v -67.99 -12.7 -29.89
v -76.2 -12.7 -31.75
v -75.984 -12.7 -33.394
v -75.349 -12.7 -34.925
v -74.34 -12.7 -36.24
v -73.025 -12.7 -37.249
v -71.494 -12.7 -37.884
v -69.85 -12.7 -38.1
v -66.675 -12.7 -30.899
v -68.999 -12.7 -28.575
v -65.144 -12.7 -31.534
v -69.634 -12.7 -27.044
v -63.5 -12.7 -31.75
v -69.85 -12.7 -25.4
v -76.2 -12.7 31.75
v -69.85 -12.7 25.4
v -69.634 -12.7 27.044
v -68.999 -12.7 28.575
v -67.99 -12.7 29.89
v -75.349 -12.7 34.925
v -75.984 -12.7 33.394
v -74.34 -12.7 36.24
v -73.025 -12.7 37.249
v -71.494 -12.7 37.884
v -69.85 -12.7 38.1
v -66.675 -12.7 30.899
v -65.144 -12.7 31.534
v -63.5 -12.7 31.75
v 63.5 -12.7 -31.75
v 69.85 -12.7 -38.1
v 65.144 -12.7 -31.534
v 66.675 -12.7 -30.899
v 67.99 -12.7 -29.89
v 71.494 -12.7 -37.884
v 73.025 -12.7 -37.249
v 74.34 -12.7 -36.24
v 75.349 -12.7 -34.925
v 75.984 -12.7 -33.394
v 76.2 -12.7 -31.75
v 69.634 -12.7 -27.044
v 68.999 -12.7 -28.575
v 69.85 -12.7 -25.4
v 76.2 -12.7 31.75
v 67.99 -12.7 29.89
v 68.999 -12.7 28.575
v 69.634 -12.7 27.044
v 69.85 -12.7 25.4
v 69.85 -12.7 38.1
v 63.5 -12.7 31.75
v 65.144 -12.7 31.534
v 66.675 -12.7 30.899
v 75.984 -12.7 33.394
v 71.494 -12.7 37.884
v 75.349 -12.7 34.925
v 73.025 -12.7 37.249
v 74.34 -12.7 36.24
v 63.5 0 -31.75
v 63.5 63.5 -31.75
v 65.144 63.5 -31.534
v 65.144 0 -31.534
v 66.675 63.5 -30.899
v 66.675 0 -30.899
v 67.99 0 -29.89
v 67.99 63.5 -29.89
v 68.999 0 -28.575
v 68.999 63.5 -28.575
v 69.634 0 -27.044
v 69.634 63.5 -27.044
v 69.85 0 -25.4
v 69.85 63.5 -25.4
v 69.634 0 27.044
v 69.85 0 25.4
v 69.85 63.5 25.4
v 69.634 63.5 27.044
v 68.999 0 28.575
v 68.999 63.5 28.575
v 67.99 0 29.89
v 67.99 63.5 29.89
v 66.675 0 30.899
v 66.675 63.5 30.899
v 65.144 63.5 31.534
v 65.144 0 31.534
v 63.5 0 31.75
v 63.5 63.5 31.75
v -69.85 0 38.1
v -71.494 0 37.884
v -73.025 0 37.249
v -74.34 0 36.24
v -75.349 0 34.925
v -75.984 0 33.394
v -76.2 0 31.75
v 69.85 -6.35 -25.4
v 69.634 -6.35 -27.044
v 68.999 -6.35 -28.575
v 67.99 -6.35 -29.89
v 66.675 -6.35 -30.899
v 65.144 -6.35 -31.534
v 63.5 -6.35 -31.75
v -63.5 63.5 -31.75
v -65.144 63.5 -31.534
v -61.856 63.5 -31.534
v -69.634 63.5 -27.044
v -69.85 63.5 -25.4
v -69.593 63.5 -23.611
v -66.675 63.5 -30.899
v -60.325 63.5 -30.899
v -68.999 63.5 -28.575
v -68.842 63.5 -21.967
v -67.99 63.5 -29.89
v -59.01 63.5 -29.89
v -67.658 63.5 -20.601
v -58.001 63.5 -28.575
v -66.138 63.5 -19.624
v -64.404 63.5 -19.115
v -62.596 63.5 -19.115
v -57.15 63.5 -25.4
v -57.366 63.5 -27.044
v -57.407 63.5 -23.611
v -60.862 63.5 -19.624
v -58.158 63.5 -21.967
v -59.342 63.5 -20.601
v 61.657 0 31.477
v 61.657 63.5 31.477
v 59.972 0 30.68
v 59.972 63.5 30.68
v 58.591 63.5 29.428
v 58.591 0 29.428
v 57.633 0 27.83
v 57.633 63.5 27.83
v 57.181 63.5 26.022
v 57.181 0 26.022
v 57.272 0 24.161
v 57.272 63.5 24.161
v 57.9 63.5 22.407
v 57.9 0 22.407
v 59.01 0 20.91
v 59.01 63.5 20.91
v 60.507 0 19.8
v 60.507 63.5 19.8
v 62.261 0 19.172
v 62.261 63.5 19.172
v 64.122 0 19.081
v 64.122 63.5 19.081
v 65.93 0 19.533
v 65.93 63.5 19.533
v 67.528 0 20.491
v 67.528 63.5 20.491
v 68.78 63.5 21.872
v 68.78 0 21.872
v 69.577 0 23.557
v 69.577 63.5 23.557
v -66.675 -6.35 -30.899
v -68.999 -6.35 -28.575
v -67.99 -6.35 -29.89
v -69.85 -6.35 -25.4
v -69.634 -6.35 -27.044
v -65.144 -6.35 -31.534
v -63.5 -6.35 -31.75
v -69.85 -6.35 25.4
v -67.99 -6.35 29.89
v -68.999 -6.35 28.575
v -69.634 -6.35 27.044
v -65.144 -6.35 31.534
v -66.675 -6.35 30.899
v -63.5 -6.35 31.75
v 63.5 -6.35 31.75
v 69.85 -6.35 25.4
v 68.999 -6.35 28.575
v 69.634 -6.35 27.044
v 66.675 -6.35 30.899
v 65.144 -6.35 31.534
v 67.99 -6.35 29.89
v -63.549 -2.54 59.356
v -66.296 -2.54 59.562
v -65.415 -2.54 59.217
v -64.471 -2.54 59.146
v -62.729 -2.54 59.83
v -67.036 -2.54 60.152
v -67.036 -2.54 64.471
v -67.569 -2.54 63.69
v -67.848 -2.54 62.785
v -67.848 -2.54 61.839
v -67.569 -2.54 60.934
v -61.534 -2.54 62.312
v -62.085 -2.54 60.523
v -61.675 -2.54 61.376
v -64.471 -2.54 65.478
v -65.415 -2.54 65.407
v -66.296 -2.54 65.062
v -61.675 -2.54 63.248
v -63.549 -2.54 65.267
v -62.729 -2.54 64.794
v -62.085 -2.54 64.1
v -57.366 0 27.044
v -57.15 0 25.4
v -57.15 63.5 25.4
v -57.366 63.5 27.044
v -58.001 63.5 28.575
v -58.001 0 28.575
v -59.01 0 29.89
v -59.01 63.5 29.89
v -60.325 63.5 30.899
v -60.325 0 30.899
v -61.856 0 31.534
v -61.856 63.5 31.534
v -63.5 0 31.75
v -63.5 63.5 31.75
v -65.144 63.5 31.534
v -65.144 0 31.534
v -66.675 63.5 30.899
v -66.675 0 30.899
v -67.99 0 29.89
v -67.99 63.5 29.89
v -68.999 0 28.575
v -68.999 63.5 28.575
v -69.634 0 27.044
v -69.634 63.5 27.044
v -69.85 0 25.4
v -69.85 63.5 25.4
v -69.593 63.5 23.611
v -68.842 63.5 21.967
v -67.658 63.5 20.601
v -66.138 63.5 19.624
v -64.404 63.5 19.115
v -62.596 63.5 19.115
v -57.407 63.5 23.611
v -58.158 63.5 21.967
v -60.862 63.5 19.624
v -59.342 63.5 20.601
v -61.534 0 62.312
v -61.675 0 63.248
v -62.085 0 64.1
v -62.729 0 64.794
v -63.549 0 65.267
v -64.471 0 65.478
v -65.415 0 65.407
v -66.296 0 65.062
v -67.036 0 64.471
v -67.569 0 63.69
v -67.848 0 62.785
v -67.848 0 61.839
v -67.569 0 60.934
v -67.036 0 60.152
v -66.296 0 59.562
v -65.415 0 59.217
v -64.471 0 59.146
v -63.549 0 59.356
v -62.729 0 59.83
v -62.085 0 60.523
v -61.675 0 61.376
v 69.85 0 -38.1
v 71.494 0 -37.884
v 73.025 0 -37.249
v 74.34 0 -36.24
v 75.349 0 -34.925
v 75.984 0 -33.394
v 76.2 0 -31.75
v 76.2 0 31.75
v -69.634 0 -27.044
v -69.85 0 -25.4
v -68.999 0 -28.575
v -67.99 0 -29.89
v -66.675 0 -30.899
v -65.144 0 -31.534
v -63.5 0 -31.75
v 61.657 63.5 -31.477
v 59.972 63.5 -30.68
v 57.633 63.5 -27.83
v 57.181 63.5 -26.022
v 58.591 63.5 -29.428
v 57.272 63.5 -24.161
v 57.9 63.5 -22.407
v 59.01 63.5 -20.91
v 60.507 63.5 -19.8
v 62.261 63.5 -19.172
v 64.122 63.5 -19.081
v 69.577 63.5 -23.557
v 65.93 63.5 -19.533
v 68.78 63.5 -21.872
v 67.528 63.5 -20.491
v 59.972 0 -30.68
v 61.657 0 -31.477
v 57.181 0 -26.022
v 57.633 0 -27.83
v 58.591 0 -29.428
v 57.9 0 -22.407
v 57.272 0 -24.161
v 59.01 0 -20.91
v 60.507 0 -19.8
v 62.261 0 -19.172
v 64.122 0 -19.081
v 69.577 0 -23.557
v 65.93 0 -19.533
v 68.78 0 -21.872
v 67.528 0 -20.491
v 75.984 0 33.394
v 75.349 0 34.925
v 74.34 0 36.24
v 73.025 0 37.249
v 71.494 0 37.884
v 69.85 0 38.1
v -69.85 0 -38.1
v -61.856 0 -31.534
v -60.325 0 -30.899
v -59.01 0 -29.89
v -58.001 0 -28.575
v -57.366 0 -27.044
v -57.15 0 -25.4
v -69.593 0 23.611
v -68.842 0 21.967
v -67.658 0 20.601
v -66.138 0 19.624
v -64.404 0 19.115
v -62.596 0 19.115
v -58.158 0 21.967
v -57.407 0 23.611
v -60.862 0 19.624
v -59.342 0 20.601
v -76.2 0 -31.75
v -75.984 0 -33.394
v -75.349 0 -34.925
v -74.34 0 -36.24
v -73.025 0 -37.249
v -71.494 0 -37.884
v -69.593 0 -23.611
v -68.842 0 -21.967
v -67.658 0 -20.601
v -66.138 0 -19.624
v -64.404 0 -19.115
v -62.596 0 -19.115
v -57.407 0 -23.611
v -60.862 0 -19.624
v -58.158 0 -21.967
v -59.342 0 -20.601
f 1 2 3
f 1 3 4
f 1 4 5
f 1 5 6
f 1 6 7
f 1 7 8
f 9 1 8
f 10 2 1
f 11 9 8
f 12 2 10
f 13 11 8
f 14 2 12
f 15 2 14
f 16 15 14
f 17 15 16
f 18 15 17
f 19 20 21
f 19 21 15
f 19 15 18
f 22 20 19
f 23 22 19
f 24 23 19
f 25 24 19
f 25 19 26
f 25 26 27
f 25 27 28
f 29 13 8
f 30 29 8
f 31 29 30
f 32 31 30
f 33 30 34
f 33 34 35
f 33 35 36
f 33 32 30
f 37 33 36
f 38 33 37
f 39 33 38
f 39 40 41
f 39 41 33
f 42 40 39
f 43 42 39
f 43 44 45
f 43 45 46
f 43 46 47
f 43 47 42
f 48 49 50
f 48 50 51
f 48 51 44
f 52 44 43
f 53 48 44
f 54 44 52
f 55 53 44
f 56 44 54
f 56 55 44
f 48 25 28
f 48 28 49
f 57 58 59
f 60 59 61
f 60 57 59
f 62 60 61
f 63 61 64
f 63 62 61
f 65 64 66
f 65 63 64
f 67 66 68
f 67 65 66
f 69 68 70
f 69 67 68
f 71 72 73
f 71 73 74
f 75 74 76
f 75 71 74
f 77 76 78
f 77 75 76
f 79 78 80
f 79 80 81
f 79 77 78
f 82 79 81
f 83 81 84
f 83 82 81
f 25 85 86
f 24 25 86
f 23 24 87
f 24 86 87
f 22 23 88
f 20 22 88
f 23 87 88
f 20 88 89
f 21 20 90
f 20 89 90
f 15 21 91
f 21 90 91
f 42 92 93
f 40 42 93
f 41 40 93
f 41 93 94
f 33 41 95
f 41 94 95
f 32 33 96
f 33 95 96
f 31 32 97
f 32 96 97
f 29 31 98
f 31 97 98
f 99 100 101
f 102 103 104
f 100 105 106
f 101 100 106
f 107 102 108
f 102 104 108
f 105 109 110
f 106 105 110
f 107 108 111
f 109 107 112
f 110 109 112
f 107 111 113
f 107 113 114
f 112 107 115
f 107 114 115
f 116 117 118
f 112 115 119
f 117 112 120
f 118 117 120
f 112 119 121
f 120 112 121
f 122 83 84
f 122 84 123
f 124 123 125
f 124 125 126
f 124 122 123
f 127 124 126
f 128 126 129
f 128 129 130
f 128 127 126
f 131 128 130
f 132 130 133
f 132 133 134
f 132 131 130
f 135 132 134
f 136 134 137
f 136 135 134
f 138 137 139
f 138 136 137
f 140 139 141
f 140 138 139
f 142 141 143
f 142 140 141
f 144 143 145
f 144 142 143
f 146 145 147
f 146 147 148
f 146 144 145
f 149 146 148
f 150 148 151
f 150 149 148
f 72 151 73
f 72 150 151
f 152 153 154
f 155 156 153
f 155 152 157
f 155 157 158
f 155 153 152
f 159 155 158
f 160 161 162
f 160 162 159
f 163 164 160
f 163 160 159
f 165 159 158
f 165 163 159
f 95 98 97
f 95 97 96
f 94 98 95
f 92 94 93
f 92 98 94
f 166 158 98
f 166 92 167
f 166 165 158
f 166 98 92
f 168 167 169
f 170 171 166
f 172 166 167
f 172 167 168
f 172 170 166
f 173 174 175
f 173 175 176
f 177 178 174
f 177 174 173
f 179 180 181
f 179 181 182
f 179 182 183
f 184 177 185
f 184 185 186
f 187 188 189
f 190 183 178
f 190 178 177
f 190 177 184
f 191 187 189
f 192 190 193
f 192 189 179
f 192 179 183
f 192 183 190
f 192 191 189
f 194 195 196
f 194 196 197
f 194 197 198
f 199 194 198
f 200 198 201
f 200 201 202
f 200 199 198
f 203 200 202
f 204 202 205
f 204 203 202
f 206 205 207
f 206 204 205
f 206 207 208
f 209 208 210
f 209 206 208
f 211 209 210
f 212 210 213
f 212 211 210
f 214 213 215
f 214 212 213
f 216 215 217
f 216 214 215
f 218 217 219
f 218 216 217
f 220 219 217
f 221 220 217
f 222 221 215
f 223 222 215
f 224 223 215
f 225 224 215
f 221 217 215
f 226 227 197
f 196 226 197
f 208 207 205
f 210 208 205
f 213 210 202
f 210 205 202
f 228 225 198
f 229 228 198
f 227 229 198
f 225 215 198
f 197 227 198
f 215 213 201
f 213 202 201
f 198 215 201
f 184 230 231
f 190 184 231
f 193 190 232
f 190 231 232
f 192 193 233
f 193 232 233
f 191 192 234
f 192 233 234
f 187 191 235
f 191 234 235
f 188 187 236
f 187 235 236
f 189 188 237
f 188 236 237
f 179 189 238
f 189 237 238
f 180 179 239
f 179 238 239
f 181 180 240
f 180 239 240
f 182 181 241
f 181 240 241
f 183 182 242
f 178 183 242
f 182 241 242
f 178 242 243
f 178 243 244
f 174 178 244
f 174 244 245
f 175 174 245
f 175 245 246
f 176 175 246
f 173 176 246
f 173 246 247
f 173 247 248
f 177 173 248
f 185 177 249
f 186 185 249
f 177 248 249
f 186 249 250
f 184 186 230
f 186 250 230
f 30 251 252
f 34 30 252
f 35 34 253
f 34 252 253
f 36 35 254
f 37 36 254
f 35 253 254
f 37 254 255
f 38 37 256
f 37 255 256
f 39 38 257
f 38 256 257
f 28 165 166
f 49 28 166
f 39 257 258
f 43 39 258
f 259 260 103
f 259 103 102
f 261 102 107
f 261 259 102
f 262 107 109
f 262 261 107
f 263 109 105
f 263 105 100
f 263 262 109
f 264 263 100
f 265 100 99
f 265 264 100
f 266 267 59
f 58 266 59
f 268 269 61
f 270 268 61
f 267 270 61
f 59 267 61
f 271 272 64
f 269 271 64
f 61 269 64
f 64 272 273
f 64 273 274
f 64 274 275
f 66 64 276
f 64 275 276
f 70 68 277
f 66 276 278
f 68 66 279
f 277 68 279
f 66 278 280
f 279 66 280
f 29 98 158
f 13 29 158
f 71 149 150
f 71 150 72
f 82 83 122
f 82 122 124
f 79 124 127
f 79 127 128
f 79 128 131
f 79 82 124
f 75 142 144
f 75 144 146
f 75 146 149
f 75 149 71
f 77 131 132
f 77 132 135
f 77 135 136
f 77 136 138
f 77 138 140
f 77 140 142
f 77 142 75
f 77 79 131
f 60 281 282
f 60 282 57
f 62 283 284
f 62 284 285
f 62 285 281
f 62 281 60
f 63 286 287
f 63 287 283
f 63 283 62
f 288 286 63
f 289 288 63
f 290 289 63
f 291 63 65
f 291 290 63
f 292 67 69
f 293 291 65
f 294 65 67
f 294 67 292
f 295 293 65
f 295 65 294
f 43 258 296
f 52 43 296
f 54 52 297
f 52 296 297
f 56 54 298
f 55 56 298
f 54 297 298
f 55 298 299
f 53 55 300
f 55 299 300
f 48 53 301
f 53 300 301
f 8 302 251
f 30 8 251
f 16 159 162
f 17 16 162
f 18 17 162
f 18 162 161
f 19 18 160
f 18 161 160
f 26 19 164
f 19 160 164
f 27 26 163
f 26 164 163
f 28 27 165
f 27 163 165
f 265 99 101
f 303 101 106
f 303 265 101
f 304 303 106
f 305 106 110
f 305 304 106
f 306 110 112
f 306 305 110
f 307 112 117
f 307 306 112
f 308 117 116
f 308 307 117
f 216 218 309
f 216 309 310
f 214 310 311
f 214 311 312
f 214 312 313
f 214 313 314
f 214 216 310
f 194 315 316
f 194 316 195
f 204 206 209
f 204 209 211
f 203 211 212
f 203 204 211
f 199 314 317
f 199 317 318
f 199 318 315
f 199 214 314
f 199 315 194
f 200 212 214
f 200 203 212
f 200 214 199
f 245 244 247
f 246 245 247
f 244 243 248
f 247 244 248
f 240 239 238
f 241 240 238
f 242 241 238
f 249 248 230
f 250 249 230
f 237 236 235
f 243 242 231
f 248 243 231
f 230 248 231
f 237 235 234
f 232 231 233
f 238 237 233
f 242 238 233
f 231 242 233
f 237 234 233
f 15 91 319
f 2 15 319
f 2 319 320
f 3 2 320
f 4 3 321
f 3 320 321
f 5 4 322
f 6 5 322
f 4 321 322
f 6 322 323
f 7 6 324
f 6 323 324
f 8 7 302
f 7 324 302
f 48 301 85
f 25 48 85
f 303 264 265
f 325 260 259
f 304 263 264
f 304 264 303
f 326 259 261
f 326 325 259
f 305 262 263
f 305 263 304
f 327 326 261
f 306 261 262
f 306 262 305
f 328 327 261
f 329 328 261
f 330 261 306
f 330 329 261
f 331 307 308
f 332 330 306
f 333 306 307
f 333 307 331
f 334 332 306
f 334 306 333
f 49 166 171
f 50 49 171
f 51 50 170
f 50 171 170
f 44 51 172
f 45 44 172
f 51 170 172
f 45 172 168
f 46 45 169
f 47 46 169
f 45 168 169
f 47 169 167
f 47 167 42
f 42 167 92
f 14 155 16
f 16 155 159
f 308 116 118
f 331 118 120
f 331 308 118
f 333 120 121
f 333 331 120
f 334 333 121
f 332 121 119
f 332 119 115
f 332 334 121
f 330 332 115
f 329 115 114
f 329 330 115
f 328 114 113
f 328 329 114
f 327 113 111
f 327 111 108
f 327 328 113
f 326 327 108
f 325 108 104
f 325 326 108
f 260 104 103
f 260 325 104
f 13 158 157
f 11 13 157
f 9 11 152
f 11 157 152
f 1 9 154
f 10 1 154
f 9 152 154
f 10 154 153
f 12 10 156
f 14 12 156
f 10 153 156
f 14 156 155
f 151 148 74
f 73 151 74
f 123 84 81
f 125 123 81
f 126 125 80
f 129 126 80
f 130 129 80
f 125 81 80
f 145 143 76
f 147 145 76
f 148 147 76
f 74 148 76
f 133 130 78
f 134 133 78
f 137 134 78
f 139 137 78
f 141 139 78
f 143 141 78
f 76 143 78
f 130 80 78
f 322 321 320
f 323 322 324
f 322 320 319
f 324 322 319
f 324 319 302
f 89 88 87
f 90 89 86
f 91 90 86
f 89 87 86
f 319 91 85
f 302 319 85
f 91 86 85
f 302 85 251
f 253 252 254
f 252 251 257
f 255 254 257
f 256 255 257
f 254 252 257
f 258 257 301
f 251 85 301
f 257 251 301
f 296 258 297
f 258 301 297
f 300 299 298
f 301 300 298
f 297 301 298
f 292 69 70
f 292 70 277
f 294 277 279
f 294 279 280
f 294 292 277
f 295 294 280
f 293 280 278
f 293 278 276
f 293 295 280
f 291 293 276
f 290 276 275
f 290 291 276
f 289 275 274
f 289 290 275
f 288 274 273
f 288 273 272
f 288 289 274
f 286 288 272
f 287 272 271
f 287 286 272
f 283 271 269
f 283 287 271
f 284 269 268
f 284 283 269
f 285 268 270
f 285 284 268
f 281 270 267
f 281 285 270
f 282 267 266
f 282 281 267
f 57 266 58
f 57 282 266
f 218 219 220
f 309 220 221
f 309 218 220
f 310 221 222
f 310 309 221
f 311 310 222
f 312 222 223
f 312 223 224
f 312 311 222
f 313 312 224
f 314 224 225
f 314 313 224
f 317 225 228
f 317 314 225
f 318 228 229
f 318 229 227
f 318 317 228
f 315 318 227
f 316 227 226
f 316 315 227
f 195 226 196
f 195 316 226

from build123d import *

# Parameters (mm, degrees)
F1_DEPTH = 12.7
F2_DEPTH = 63.5
F3_DEPTH = 6.35
F4_R     = 3.175
F5_DEPTH = 2.54


with BuildPart() as f1:
    # F0 (on Front) → F1 (new body)
    with BuildSketch(Plane.XZ):
        with BuildLine():
            Line((69.85, 38.1), (-69.85, 38.1))
            ThreePointArc((-69.85, 38.1), (-74.3401280605, 36.2401280605), (-76.2, 31.75))
            Line((-76.2, 31.75), (-76.2, -31.75))
            ThreePointArc((-76.2, -31.75), (-74.3401280605, -36.2401280605), (-69.85, -38.1))
            Line((-69.85, -38.1), (69.85, -38.1))
            ThreePointArc((69.85, -38.1), (74.3401280605, -36.2401280605), (76.2, -31.75))
            Line((76.2, -31.75), (76.2, 31.75))
            ThreePointArc((76.2, 31.75), (74.3401280605, 36.2401280605), (69.85, 38.1))
        make_face()
        with BuildLine():
            ThreePointArc((-69.85, 25.4), (-67.9901280605, 29.8901280605), (-63.5, 31.75))
            Line((-63.5, 31.75), (63.5, 31.75))
            ThreePointArc((63.5, 31.75), (67.9901280605, 29.8901280605), (69.85, 25.4))
            Line((69.85, 25.4), (69.85, -25.4))
            ThreePointArc((69.85, -25.4), (67.9901280605, -29.8901280605), (63.5, -31.75))
            Line((63.5, -31.75), (-63.5, -31.75))
            ThreePointArc((-63.5, -31.75), (-67.9901280605, -29.8901280605), (-69.85, -25.4))
            Line((-69.85, -25.4), (-69.85, 25.4))
        make_face(mode=Mode.SUBTRACT)
    extrude(amount=F1_DEPTH)

    # F0 (on Front) → F3 (join)
    with BuildSketch(Plane.XZ):
        with BuildLine():
            Line((63.5, 31.75), (-63.5, 31.75))
            ThreePointArc((-63.5, 31.75), (-59.0098719395, 29.8901280605), (-57.15, 25.4))
            ThreePointArc((-57.15, 25.4), (-63.5, 19.05), (-69.85, 25.4))
            Line((-69.85, 25.4), (-69.85, -25.4))
            ThreePointArc((-69.85, -25.4), (-63.5, -19.05), (-57.15, -25.4))
            ThreePointArc((-57.15, -25.4), (-59.0098719395, -29.8901280605), (-63.5, -31.75))
            Line((-63.5, -31.75), (63.5, -31.75))
            ThreePointArc((63.5, -31.75), (59.0098719395, -20.9098719395), (69.85, -25.4))
            Line((69.85, -25.4), (69.85, 25.4))
            ThreePointArc((69.85, 25.4), (59.0098719395, 20.9098719395), (63.5, 31.75))
        make_face()
        with BuildLine():
            ThreePointArc((-57.15, 25.4), (-59.0098719395, 29.8901280605), (-63.5, 31.75))
            ThreePointArc((-63.5, 31.75), (-67.9901280605, 29.8901280605), (-69.85, 25.4))
            ThreePointArc((-69.85, 25.4), (-63.5, 19.05), (-57.15, 25.4))
        make_face()
        with BuildLine():
            ThreePointArc((69.85, 25.4), (67.9901280605, 29.8901280605), (63.5, 31.75))
            ThreePointArc((63.5, 31.75), (59.0098719395, 20.9098719395), (69.85, 25.4))
        make_face()
        with BuildLine():
            ThreePointArc((63.5, -31.75), (67.9901280605, -29.8901280605), (69.85, -25.4))
            ThreePointArc((69.85, -25.4), (59.0098719395, -20.9098719395), (63.5, -31.75))
        make_face()
        with BuildLine():
            ThreePointArc((-57.15, -25.4), (-63.5, -19.05), (-69.85, -25.4))
            ThreePointArc((-69.85, -25.4), (-67.9901280605, -29.8901280605), (-63.5, -31.75))
            ThreePointArc((-63.5, -31.75), (-59.0098719395, -29.8901280605), (-57.15, -25.4))
        make_face()
    extrude(amount=F3_DEPTH)


with BuildPart() as f2:
    # F0 (on Front) → F2 (new body)
    with BuildSketch(Plane.XZ):
        with BuildLine():
            ThreePointArc((-57.15, 25.4), (-59.0098719395, 29.8901280605), (-63.5, 31.75))
            ThreePointArc((-63.5, 31.75), (-67.9901280605, 29.8901280605), (-69.85, 25.4))
            ThreePointArc((-69.85, 25.4), (-63.5, 19.05), (-57.15, 25.4))
        make_face()
    extrude(amount=-F2_DEPTH)


with BuildPart() as f2b:
    # F0 (on Front) → F2, piece 2 (new body)
    with BuildSketch(Plane.XZ):
        with BuildLine():
            ThreePointArc((-57.15, -25.4), (-63.5, -19.05), (-69.85, -25.4))
            ThreePointArc((-69.85, -25.4), (-67.9901280605, -29.8901280605), (-63.5, -31.75))
            ThreePointArc((-63.5, -31.75), (-59.0098719395, -29.8901280605), (-57.15, -25.4))
        make_face()
    extrude(amount=-F2_DEPTH)


with BuildPart() as f2c:
    # F0 (on Front) → F2, piece 3 (new body)
    with BuildSketch(Plane.XZ):
        with BuildLine():
            ThreePointArc((63.5, -31.75), (67.9901280605, -29.8901280605), (69.85, -25.4))
            ThreePointArc((69.85, -25.4), (59.0098719395, -20.9098719395), (63.5, -31.75))
        make_face()
    extrude(amount=-F2_DEPTH)


with BuildPart() as f2d:
    # F0 (on Front) → F2, piece 4 (new body)
    with BuildSketch(Plane.XZ):
        with BuildLine():
            ThreePointArc((69.85, 25.4), (67.9901280605, 29.8901280605), (63.5, 31.75))
            ThreePointArc((63.5, 31.75), (59.0098719395, 20.9098719395), (69.85, 25.4))
        make_face()
    extrude(amount=-F2_DEPTH)


with BuildPart() as f5:
    # F4 (on Front) → F5 (new body)
    with BuildSketch(Plane.XZ):
        with Locations((-64.708545804, 62.3119361699)):
            Circle(F4_R)
    extrude(amount=F5_DEPTH)


solid = Compound([f1.part, f2.part, f2b.part, f2c.part, f2d.part, f5.part])
